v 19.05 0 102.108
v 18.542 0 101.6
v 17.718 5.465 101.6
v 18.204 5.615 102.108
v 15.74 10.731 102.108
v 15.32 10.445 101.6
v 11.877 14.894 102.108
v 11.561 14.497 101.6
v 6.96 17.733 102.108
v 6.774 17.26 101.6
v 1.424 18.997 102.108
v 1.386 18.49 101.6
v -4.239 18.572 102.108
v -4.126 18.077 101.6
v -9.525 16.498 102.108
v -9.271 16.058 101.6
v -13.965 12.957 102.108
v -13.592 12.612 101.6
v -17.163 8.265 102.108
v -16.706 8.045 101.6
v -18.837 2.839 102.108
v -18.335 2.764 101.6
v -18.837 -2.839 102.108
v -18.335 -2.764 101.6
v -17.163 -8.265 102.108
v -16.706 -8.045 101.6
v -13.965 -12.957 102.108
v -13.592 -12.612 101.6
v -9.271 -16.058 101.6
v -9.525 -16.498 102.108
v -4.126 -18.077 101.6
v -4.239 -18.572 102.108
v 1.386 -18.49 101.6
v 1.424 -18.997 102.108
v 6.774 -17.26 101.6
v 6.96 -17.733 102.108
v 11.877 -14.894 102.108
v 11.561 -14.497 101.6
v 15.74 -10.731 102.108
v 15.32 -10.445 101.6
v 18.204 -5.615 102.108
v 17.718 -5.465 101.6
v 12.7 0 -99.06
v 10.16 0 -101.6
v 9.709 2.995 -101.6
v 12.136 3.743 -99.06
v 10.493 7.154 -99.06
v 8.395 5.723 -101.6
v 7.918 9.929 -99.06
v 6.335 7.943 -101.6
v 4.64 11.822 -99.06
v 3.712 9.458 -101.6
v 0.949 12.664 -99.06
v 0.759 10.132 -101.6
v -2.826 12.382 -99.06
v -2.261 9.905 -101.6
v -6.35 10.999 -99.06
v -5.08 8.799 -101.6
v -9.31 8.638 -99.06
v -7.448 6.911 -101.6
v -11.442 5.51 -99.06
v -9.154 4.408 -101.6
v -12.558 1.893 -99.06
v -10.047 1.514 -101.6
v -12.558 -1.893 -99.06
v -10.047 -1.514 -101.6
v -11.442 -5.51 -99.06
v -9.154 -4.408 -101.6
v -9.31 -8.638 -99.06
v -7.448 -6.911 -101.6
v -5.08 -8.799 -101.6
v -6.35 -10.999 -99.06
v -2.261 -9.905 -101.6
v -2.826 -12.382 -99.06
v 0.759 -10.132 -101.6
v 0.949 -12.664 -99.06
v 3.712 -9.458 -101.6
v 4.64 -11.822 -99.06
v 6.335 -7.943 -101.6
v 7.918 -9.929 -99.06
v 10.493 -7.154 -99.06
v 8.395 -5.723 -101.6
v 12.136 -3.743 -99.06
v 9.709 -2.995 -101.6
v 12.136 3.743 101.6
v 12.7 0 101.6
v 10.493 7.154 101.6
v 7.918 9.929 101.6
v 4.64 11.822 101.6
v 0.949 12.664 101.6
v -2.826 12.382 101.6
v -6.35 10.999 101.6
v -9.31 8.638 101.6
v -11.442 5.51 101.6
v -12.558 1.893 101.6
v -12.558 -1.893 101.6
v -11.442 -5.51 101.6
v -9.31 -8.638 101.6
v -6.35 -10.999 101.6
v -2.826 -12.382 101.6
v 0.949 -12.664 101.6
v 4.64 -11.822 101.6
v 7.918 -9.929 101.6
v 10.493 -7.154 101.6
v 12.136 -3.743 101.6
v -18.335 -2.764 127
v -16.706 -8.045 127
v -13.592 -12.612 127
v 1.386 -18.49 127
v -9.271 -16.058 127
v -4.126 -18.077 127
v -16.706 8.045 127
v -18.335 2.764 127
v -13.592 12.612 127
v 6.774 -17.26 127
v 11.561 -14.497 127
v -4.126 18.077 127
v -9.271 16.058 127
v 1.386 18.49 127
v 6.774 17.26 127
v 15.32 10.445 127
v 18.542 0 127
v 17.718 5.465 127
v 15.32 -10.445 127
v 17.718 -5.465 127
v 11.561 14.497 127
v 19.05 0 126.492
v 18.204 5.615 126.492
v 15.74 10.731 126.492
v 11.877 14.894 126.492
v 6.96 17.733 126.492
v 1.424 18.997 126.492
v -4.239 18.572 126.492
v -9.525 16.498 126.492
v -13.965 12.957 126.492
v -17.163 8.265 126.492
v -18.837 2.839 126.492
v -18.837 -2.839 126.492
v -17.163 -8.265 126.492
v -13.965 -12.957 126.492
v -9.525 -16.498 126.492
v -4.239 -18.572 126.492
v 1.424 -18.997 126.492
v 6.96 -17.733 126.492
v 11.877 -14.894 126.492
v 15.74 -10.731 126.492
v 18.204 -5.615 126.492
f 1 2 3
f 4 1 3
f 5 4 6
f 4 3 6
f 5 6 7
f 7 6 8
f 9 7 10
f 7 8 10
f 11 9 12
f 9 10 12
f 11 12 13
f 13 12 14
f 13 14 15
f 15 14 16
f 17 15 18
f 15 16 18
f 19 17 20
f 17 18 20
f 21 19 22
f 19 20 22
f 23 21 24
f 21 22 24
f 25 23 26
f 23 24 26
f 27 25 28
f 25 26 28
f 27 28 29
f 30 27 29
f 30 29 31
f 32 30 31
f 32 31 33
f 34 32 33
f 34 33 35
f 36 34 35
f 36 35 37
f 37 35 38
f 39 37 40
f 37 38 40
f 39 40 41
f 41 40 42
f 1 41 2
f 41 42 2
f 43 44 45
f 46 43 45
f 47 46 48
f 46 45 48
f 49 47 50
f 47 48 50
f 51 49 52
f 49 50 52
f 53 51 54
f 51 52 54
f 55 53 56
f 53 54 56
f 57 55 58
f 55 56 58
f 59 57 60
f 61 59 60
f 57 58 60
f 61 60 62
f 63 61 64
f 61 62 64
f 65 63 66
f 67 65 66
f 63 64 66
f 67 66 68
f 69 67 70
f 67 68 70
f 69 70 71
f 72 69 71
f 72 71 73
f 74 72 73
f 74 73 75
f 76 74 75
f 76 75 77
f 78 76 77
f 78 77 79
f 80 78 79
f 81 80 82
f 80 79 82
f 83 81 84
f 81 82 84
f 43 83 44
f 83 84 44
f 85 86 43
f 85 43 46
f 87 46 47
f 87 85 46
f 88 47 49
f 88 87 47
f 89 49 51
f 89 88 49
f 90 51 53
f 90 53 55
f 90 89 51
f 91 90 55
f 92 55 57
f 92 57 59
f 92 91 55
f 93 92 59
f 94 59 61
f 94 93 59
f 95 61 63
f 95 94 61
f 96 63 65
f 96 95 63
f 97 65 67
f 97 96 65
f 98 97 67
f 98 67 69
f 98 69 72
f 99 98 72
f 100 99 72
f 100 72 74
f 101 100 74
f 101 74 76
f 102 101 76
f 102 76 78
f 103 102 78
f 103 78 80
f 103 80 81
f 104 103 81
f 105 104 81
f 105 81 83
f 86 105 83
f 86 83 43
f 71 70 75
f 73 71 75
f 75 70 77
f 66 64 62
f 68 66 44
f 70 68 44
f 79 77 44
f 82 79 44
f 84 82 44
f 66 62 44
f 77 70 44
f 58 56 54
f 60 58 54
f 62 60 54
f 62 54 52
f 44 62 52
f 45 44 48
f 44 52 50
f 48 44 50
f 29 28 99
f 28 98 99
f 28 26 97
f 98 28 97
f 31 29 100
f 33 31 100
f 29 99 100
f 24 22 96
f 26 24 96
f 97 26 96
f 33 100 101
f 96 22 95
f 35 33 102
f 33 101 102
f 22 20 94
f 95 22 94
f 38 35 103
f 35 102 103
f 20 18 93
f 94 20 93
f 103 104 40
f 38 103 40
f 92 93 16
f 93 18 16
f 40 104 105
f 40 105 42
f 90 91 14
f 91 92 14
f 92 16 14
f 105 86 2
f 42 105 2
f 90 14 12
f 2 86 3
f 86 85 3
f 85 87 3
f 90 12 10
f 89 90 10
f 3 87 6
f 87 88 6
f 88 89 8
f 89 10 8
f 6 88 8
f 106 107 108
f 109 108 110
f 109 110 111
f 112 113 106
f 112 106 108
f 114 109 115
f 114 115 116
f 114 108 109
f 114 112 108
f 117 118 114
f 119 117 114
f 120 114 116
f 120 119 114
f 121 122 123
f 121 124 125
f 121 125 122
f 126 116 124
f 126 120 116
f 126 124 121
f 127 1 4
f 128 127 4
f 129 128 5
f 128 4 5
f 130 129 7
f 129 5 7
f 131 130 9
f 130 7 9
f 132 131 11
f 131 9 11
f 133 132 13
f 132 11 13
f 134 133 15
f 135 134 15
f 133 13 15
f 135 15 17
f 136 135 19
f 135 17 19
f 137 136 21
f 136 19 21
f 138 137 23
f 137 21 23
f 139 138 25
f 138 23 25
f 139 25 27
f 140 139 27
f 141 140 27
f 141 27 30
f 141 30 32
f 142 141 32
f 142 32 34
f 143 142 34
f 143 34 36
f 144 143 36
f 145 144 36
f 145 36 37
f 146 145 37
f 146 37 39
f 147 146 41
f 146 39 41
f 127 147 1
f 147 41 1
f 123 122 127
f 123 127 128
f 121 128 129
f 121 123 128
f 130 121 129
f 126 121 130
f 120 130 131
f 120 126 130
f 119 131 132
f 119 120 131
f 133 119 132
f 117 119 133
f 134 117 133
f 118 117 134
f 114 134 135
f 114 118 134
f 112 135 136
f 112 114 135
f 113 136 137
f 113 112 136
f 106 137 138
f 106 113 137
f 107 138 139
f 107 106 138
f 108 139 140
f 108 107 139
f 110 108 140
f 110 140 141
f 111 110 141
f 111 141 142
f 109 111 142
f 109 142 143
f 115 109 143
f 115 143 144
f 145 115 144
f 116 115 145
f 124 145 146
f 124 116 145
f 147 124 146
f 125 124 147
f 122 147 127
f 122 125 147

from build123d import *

# Parameters (mm, degrees)
F0_R     = 12.7
F1_DEPTH = 101.6
F2_SIZE  = 2.54
F3_R     = 19.05
F3_R_2   = 12.7
F4_DEPTH = 25.4
F5_SIZE  = 0.508


with BuildPart() as f1:
    # F0 (on Top) → F1 (new body, symmetric)
    with BuildSketch(Plane.XY):
        Circle(F0_R)
    extrude(amount=F1_DEPTH, both=True)

    # F2
    f2_edges = [f1.edges().sort_by_distance(p)[0] for p in [
        (-12.7, 0, -101.6),
    ]]
    chamfer(f2_edges, length=F2_SIZE)

    # F3 (on face) → F4 (join)
    with BuildSketch(Plane.XY.offset(101.6)):
        Circle(F3_R)
        Circle(F3_R_2, mode=Mode.SUBTRACT)
        Circle(F3_R_2)
    extrude(amount=F4_DEPTH)

    # F5
    f5_edges = [f1.edges().sort_by_distance(p)[0] for p in [
        (-19.05, 0, 127),
        (-19.05, 0, 101.6),
    ]]
    chamfer(f5_edges, length=F5_SIZE)


solid = f1.part
